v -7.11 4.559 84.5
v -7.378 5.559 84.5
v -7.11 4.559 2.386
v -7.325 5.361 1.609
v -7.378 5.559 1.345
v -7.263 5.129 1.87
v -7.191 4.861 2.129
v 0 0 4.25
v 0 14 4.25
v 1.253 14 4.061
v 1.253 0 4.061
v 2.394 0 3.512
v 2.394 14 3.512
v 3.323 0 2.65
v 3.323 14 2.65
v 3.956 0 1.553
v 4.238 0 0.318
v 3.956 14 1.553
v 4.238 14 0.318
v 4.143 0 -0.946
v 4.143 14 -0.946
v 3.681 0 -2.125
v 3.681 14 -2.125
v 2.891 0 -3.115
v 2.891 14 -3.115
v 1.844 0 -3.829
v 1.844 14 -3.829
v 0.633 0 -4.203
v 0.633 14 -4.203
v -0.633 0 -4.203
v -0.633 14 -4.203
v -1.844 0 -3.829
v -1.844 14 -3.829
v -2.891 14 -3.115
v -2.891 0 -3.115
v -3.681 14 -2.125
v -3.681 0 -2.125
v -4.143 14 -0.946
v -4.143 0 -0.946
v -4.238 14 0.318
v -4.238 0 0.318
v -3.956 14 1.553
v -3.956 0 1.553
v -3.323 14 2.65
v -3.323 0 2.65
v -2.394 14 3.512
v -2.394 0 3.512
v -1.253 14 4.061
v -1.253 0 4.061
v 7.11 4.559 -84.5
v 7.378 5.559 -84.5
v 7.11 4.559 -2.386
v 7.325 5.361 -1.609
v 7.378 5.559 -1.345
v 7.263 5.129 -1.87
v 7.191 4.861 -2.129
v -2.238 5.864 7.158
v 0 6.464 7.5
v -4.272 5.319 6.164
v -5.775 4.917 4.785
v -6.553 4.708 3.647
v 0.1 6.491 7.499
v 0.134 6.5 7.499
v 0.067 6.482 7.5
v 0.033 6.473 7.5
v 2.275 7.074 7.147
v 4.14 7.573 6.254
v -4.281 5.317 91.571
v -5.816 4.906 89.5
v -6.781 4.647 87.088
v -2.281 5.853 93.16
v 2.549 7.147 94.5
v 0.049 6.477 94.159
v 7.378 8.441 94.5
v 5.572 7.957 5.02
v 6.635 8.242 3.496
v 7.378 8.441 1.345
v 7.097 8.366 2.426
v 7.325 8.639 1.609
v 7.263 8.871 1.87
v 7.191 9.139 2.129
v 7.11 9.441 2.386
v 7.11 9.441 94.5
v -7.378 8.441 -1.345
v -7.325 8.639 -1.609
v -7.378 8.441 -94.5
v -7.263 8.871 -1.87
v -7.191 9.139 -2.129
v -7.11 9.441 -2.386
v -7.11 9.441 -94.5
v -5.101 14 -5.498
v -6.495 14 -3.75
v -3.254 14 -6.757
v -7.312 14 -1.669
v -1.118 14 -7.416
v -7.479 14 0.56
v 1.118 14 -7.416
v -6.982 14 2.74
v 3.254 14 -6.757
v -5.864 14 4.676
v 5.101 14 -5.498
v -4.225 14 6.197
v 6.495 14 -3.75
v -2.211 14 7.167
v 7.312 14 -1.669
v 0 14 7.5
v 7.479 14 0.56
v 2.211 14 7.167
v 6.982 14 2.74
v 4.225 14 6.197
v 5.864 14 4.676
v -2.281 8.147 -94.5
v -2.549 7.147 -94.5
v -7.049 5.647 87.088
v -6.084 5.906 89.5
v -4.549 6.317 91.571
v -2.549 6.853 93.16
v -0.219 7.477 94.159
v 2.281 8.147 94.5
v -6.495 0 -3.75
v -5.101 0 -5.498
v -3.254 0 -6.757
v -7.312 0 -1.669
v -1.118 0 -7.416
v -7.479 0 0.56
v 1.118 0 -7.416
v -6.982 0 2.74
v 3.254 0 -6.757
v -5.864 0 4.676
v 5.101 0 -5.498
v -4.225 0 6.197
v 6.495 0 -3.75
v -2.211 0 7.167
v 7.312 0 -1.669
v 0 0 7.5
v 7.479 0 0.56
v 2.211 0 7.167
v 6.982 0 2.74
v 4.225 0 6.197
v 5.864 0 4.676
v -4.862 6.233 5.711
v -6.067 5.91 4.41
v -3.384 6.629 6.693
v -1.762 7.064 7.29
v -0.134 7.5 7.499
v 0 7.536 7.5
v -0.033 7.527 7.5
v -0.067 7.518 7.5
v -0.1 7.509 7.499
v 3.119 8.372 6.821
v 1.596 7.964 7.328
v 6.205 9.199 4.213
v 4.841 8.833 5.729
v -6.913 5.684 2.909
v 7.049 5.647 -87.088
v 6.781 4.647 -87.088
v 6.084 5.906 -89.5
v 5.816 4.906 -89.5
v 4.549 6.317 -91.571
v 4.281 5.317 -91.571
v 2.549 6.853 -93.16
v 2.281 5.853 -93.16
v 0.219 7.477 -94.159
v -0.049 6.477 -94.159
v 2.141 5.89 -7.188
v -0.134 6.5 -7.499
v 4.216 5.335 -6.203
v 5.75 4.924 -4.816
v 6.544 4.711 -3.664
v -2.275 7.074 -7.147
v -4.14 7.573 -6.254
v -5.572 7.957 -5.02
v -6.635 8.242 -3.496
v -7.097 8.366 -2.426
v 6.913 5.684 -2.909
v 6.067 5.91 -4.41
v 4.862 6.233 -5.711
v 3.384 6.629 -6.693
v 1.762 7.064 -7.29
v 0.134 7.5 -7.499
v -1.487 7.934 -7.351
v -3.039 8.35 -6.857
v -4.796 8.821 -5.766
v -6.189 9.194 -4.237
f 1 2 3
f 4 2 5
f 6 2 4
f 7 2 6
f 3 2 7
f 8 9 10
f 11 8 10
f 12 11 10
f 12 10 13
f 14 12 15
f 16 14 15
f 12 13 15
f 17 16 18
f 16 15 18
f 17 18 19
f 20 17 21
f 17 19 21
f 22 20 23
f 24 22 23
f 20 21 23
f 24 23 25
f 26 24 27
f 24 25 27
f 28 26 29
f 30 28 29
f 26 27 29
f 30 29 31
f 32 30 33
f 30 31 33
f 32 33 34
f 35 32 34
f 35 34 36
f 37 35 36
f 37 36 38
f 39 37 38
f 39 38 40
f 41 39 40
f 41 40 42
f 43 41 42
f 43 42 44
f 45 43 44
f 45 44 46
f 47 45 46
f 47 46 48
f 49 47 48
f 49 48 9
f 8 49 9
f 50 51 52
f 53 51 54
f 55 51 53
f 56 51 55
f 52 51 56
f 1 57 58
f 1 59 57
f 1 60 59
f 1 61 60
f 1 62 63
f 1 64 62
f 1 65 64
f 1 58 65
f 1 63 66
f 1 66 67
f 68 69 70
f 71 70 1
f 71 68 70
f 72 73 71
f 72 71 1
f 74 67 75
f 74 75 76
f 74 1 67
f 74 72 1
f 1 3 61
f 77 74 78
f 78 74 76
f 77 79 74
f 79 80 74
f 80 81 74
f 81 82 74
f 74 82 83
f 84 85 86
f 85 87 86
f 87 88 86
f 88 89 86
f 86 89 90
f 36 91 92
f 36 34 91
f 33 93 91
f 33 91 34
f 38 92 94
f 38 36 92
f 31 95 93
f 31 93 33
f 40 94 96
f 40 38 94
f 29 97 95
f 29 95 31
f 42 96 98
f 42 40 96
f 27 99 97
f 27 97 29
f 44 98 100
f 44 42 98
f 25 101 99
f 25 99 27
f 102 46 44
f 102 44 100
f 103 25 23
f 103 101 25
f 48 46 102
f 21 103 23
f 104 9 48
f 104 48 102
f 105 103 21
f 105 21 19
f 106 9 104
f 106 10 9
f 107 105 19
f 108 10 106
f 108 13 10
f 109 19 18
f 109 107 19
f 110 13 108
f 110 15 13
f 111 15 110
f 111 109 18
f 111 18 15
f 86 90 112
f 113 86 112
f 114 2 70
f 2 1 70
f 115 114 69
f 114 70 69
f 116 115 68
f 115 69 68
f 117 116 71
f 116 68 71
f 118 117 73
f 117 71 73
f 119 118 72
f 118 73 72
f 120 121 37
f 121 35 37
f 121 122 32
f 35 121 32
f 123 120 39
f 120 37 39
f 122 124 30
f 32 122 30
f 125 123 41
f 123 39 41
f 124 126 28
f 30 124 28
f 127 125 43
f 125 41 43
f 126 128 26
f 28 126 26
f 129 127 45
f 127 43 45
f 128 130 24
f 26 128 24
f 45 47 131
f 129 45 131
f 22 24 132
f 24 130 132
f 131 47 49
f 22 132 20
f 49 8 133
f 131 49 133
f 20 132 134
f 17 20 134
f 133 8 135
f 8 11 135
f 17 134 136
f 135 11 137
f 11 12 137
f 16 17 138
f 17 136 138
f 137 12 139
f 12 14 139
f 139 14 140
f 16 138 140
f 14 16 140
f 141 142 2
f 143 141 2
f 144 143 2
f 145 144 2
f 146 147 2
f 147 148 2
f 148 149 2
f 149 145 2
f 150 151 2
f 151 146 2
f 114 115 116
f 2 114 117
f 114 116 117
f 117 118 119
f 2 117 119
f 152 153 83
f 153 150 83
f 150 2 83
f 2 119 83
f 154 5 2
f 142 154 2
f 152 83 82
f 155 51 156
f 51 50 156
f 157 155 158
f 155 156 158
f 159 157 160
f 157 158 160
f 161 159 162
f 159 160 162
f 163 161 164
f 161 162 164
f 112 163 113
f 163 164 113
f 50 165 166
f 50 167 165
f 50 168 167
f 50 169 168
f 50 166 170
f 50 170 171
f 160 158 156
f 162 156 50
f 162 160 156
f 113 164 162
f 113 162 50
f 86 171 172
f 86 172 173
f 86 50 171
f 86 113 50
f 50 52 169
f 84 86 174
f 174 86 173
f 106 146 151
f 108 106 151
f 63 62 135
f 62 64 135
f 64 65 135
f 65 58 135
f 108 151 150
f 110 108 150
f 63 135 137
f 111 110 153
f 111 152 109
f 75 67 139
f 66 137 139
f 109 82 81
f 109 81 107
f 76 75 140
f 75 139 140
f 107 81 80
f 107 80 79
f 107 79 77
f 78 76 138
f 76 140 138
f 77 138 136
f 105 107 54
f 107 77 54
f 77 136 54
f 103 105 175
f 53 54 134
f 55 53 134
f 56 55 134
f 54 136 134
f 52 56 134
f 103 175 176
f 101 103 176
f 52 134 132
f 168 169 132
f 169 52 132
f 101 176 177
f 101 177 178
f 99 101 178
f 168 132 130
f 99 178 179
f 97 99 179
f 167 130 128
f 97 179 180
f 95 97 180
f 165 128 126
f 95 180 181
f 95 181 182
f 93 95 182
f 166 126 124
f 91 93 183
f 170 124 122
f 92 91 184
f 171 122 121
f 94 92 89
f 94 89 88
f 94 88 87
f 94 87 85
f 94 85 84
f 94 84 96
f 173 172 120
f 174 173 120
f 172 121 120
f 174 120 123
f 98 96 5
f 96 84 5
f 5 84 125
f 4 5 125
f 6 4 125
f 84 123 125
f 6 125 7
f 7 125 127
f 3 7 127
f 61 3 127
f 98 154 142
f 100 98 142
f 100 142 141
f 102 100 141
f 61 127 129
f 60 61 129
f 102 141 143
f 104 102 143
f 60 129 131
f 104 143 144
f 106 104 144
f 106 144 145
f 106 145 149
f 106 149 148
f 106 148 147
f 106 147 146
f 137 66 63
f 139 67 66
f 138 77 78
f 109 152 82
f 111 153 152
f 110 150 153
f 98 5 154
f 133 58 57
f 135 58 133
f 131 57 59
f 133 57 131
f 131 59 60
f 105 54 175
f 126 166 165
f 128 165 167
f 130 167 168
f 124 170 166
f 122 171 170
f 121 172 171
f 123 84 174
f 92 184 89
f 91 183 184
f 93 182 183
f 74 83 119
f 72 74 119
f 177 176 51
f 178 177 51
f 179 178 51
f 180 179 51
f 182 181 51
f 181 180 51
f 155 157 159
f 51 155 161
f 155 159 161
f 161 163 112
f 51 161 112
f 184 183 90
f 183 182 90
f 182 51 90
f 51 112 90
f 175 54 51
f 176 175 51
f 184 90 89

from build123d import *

# Parameters (mm, degrees)
SKETCH1_R           = 7.5
BOSS_EXTRUDE2_DEPTH = 14
CUT_EXTRUDE1_REACH  = 19.564
SKETCH2_R           = 4.25
BOSS_EXTRUDE3_START = -7.279118874
BOSS_EXTRUDE3_DEPTH = 1.03527618
FILLET1_R           = 10
CIRPATTERN1_COUNT   = 2
FILLET3_R           = 10


with BuildPart() as part:
    # Sketch1 → Boss-Extrude2 (new body)
    with BuildSketch(Plane(origin=(0, 0, 0), x_dir=(1, 0, 0), z_dir=(0, 1, 0))):
        with Locations(Location((0, 0, 0), (0, 0, 270))):
            Circle(SKETCH1_R)
    extrude(amount=BOSS_EXTRUDE2_DEPTH)

    # Sketch2 → Cut-Extrude1 (cut, up to next)
    with BuildSketch(Plane(origin=(0, 14, 0), x_dir=(1, 0, 0), z_dir=(0, 1, 0)), mode=Mode.PRIVATE) as cut_extrude1_sk1:
        with Locations(Location((0, 0, 0), (0, 0, 270))):
            Circle(SKETCH2_R)
    cut_extrude1_tool1 = extrude(cut_extrude1_sk1.sketch, amount=-CUT_EXTRUDE1_REACH, mode=Mode.PRIVATE) & part.part
    add(cut_extrude1_tool1.solids().sort_by_distance((0, 14, 0))[0], mode=Mode.SUBTRACT)

    # Boss-Extrude3: read off the stored shape, not the designer's step
    # Boss-Extrude3 outline → Boss-Extrude3 (add)
    with BuildSketch(Plane(origin=(0, 0, 0), x_dir=(0.9659258262890672, 0.2588190451025251, 0), z_dir=(0.25881904510252507, -0.9659258262890672, 0)).offset(BOSS_EXTRUDE3_START)):
        with BuildLine():
            add(Edge.make_bspline(
                [(-5.688266684, 1.344969698), (-4.547659305, 7.389056985), (1.811733316, 7.498803292)],
                knots=[0.18030465, 0.18030465, 0.18030465, 1.551469461, 1.551469461, 1.551469461], degree=2, weights=[1, 0.771122328, 0.993637519]))
            add(Edge.make_bspline(
                [(1.811733316, 7.498803292), (8.171125936, 7.389056985), (9.311733316, 1.344969698)],
                knots=[1.590123193, 1.590123193, 1.590123193, 2.961288004, 2.961288004, 2.961288004], degree=2, weights=[0.993637519, 0.771122328, 1]))
            Line((9.311733316, 1.344969698), (9.311733316, 94.5))
            Line((9.311733316, 94.5), (-5.688266684, 94.5))
            Line((-5.688266684, 94.5), (-5.688266684, 1.344969698))
        make_face()
    boss_extrude3 = extrude(amount=BOSS_EXTRUDE3_DEPTH)

    # Fillet1
    fillet1_edges = [part.edges().sort_by_distance(p)[0] for p in [
        (-7.244443697, 5.058857162, 94.5),
    ]]
    fillet(fillet1_edges, radius=FILLET1_R)

    # CirPattern1: Boss-Extrude3 ×2 about axis
    cirpattern1_axis = Axis((0, 0, 0), (0, 1, 0))
    for i in range(1, CIRPATTERN1_COUNT):
        add(boss_extrude3.rotate(cirpattern1_axis, i * 360 / CIRPATTERN1_COUNT))

    # Fillet3
    fillet3_edges = [part.edges().sort_by_distance(p)[0] for p in [
        (7.244443697, 5.058857162, -94.5),
    ]]
    fillet(fillet3_edges, radius=FILLET3_R)


solid = part.part
